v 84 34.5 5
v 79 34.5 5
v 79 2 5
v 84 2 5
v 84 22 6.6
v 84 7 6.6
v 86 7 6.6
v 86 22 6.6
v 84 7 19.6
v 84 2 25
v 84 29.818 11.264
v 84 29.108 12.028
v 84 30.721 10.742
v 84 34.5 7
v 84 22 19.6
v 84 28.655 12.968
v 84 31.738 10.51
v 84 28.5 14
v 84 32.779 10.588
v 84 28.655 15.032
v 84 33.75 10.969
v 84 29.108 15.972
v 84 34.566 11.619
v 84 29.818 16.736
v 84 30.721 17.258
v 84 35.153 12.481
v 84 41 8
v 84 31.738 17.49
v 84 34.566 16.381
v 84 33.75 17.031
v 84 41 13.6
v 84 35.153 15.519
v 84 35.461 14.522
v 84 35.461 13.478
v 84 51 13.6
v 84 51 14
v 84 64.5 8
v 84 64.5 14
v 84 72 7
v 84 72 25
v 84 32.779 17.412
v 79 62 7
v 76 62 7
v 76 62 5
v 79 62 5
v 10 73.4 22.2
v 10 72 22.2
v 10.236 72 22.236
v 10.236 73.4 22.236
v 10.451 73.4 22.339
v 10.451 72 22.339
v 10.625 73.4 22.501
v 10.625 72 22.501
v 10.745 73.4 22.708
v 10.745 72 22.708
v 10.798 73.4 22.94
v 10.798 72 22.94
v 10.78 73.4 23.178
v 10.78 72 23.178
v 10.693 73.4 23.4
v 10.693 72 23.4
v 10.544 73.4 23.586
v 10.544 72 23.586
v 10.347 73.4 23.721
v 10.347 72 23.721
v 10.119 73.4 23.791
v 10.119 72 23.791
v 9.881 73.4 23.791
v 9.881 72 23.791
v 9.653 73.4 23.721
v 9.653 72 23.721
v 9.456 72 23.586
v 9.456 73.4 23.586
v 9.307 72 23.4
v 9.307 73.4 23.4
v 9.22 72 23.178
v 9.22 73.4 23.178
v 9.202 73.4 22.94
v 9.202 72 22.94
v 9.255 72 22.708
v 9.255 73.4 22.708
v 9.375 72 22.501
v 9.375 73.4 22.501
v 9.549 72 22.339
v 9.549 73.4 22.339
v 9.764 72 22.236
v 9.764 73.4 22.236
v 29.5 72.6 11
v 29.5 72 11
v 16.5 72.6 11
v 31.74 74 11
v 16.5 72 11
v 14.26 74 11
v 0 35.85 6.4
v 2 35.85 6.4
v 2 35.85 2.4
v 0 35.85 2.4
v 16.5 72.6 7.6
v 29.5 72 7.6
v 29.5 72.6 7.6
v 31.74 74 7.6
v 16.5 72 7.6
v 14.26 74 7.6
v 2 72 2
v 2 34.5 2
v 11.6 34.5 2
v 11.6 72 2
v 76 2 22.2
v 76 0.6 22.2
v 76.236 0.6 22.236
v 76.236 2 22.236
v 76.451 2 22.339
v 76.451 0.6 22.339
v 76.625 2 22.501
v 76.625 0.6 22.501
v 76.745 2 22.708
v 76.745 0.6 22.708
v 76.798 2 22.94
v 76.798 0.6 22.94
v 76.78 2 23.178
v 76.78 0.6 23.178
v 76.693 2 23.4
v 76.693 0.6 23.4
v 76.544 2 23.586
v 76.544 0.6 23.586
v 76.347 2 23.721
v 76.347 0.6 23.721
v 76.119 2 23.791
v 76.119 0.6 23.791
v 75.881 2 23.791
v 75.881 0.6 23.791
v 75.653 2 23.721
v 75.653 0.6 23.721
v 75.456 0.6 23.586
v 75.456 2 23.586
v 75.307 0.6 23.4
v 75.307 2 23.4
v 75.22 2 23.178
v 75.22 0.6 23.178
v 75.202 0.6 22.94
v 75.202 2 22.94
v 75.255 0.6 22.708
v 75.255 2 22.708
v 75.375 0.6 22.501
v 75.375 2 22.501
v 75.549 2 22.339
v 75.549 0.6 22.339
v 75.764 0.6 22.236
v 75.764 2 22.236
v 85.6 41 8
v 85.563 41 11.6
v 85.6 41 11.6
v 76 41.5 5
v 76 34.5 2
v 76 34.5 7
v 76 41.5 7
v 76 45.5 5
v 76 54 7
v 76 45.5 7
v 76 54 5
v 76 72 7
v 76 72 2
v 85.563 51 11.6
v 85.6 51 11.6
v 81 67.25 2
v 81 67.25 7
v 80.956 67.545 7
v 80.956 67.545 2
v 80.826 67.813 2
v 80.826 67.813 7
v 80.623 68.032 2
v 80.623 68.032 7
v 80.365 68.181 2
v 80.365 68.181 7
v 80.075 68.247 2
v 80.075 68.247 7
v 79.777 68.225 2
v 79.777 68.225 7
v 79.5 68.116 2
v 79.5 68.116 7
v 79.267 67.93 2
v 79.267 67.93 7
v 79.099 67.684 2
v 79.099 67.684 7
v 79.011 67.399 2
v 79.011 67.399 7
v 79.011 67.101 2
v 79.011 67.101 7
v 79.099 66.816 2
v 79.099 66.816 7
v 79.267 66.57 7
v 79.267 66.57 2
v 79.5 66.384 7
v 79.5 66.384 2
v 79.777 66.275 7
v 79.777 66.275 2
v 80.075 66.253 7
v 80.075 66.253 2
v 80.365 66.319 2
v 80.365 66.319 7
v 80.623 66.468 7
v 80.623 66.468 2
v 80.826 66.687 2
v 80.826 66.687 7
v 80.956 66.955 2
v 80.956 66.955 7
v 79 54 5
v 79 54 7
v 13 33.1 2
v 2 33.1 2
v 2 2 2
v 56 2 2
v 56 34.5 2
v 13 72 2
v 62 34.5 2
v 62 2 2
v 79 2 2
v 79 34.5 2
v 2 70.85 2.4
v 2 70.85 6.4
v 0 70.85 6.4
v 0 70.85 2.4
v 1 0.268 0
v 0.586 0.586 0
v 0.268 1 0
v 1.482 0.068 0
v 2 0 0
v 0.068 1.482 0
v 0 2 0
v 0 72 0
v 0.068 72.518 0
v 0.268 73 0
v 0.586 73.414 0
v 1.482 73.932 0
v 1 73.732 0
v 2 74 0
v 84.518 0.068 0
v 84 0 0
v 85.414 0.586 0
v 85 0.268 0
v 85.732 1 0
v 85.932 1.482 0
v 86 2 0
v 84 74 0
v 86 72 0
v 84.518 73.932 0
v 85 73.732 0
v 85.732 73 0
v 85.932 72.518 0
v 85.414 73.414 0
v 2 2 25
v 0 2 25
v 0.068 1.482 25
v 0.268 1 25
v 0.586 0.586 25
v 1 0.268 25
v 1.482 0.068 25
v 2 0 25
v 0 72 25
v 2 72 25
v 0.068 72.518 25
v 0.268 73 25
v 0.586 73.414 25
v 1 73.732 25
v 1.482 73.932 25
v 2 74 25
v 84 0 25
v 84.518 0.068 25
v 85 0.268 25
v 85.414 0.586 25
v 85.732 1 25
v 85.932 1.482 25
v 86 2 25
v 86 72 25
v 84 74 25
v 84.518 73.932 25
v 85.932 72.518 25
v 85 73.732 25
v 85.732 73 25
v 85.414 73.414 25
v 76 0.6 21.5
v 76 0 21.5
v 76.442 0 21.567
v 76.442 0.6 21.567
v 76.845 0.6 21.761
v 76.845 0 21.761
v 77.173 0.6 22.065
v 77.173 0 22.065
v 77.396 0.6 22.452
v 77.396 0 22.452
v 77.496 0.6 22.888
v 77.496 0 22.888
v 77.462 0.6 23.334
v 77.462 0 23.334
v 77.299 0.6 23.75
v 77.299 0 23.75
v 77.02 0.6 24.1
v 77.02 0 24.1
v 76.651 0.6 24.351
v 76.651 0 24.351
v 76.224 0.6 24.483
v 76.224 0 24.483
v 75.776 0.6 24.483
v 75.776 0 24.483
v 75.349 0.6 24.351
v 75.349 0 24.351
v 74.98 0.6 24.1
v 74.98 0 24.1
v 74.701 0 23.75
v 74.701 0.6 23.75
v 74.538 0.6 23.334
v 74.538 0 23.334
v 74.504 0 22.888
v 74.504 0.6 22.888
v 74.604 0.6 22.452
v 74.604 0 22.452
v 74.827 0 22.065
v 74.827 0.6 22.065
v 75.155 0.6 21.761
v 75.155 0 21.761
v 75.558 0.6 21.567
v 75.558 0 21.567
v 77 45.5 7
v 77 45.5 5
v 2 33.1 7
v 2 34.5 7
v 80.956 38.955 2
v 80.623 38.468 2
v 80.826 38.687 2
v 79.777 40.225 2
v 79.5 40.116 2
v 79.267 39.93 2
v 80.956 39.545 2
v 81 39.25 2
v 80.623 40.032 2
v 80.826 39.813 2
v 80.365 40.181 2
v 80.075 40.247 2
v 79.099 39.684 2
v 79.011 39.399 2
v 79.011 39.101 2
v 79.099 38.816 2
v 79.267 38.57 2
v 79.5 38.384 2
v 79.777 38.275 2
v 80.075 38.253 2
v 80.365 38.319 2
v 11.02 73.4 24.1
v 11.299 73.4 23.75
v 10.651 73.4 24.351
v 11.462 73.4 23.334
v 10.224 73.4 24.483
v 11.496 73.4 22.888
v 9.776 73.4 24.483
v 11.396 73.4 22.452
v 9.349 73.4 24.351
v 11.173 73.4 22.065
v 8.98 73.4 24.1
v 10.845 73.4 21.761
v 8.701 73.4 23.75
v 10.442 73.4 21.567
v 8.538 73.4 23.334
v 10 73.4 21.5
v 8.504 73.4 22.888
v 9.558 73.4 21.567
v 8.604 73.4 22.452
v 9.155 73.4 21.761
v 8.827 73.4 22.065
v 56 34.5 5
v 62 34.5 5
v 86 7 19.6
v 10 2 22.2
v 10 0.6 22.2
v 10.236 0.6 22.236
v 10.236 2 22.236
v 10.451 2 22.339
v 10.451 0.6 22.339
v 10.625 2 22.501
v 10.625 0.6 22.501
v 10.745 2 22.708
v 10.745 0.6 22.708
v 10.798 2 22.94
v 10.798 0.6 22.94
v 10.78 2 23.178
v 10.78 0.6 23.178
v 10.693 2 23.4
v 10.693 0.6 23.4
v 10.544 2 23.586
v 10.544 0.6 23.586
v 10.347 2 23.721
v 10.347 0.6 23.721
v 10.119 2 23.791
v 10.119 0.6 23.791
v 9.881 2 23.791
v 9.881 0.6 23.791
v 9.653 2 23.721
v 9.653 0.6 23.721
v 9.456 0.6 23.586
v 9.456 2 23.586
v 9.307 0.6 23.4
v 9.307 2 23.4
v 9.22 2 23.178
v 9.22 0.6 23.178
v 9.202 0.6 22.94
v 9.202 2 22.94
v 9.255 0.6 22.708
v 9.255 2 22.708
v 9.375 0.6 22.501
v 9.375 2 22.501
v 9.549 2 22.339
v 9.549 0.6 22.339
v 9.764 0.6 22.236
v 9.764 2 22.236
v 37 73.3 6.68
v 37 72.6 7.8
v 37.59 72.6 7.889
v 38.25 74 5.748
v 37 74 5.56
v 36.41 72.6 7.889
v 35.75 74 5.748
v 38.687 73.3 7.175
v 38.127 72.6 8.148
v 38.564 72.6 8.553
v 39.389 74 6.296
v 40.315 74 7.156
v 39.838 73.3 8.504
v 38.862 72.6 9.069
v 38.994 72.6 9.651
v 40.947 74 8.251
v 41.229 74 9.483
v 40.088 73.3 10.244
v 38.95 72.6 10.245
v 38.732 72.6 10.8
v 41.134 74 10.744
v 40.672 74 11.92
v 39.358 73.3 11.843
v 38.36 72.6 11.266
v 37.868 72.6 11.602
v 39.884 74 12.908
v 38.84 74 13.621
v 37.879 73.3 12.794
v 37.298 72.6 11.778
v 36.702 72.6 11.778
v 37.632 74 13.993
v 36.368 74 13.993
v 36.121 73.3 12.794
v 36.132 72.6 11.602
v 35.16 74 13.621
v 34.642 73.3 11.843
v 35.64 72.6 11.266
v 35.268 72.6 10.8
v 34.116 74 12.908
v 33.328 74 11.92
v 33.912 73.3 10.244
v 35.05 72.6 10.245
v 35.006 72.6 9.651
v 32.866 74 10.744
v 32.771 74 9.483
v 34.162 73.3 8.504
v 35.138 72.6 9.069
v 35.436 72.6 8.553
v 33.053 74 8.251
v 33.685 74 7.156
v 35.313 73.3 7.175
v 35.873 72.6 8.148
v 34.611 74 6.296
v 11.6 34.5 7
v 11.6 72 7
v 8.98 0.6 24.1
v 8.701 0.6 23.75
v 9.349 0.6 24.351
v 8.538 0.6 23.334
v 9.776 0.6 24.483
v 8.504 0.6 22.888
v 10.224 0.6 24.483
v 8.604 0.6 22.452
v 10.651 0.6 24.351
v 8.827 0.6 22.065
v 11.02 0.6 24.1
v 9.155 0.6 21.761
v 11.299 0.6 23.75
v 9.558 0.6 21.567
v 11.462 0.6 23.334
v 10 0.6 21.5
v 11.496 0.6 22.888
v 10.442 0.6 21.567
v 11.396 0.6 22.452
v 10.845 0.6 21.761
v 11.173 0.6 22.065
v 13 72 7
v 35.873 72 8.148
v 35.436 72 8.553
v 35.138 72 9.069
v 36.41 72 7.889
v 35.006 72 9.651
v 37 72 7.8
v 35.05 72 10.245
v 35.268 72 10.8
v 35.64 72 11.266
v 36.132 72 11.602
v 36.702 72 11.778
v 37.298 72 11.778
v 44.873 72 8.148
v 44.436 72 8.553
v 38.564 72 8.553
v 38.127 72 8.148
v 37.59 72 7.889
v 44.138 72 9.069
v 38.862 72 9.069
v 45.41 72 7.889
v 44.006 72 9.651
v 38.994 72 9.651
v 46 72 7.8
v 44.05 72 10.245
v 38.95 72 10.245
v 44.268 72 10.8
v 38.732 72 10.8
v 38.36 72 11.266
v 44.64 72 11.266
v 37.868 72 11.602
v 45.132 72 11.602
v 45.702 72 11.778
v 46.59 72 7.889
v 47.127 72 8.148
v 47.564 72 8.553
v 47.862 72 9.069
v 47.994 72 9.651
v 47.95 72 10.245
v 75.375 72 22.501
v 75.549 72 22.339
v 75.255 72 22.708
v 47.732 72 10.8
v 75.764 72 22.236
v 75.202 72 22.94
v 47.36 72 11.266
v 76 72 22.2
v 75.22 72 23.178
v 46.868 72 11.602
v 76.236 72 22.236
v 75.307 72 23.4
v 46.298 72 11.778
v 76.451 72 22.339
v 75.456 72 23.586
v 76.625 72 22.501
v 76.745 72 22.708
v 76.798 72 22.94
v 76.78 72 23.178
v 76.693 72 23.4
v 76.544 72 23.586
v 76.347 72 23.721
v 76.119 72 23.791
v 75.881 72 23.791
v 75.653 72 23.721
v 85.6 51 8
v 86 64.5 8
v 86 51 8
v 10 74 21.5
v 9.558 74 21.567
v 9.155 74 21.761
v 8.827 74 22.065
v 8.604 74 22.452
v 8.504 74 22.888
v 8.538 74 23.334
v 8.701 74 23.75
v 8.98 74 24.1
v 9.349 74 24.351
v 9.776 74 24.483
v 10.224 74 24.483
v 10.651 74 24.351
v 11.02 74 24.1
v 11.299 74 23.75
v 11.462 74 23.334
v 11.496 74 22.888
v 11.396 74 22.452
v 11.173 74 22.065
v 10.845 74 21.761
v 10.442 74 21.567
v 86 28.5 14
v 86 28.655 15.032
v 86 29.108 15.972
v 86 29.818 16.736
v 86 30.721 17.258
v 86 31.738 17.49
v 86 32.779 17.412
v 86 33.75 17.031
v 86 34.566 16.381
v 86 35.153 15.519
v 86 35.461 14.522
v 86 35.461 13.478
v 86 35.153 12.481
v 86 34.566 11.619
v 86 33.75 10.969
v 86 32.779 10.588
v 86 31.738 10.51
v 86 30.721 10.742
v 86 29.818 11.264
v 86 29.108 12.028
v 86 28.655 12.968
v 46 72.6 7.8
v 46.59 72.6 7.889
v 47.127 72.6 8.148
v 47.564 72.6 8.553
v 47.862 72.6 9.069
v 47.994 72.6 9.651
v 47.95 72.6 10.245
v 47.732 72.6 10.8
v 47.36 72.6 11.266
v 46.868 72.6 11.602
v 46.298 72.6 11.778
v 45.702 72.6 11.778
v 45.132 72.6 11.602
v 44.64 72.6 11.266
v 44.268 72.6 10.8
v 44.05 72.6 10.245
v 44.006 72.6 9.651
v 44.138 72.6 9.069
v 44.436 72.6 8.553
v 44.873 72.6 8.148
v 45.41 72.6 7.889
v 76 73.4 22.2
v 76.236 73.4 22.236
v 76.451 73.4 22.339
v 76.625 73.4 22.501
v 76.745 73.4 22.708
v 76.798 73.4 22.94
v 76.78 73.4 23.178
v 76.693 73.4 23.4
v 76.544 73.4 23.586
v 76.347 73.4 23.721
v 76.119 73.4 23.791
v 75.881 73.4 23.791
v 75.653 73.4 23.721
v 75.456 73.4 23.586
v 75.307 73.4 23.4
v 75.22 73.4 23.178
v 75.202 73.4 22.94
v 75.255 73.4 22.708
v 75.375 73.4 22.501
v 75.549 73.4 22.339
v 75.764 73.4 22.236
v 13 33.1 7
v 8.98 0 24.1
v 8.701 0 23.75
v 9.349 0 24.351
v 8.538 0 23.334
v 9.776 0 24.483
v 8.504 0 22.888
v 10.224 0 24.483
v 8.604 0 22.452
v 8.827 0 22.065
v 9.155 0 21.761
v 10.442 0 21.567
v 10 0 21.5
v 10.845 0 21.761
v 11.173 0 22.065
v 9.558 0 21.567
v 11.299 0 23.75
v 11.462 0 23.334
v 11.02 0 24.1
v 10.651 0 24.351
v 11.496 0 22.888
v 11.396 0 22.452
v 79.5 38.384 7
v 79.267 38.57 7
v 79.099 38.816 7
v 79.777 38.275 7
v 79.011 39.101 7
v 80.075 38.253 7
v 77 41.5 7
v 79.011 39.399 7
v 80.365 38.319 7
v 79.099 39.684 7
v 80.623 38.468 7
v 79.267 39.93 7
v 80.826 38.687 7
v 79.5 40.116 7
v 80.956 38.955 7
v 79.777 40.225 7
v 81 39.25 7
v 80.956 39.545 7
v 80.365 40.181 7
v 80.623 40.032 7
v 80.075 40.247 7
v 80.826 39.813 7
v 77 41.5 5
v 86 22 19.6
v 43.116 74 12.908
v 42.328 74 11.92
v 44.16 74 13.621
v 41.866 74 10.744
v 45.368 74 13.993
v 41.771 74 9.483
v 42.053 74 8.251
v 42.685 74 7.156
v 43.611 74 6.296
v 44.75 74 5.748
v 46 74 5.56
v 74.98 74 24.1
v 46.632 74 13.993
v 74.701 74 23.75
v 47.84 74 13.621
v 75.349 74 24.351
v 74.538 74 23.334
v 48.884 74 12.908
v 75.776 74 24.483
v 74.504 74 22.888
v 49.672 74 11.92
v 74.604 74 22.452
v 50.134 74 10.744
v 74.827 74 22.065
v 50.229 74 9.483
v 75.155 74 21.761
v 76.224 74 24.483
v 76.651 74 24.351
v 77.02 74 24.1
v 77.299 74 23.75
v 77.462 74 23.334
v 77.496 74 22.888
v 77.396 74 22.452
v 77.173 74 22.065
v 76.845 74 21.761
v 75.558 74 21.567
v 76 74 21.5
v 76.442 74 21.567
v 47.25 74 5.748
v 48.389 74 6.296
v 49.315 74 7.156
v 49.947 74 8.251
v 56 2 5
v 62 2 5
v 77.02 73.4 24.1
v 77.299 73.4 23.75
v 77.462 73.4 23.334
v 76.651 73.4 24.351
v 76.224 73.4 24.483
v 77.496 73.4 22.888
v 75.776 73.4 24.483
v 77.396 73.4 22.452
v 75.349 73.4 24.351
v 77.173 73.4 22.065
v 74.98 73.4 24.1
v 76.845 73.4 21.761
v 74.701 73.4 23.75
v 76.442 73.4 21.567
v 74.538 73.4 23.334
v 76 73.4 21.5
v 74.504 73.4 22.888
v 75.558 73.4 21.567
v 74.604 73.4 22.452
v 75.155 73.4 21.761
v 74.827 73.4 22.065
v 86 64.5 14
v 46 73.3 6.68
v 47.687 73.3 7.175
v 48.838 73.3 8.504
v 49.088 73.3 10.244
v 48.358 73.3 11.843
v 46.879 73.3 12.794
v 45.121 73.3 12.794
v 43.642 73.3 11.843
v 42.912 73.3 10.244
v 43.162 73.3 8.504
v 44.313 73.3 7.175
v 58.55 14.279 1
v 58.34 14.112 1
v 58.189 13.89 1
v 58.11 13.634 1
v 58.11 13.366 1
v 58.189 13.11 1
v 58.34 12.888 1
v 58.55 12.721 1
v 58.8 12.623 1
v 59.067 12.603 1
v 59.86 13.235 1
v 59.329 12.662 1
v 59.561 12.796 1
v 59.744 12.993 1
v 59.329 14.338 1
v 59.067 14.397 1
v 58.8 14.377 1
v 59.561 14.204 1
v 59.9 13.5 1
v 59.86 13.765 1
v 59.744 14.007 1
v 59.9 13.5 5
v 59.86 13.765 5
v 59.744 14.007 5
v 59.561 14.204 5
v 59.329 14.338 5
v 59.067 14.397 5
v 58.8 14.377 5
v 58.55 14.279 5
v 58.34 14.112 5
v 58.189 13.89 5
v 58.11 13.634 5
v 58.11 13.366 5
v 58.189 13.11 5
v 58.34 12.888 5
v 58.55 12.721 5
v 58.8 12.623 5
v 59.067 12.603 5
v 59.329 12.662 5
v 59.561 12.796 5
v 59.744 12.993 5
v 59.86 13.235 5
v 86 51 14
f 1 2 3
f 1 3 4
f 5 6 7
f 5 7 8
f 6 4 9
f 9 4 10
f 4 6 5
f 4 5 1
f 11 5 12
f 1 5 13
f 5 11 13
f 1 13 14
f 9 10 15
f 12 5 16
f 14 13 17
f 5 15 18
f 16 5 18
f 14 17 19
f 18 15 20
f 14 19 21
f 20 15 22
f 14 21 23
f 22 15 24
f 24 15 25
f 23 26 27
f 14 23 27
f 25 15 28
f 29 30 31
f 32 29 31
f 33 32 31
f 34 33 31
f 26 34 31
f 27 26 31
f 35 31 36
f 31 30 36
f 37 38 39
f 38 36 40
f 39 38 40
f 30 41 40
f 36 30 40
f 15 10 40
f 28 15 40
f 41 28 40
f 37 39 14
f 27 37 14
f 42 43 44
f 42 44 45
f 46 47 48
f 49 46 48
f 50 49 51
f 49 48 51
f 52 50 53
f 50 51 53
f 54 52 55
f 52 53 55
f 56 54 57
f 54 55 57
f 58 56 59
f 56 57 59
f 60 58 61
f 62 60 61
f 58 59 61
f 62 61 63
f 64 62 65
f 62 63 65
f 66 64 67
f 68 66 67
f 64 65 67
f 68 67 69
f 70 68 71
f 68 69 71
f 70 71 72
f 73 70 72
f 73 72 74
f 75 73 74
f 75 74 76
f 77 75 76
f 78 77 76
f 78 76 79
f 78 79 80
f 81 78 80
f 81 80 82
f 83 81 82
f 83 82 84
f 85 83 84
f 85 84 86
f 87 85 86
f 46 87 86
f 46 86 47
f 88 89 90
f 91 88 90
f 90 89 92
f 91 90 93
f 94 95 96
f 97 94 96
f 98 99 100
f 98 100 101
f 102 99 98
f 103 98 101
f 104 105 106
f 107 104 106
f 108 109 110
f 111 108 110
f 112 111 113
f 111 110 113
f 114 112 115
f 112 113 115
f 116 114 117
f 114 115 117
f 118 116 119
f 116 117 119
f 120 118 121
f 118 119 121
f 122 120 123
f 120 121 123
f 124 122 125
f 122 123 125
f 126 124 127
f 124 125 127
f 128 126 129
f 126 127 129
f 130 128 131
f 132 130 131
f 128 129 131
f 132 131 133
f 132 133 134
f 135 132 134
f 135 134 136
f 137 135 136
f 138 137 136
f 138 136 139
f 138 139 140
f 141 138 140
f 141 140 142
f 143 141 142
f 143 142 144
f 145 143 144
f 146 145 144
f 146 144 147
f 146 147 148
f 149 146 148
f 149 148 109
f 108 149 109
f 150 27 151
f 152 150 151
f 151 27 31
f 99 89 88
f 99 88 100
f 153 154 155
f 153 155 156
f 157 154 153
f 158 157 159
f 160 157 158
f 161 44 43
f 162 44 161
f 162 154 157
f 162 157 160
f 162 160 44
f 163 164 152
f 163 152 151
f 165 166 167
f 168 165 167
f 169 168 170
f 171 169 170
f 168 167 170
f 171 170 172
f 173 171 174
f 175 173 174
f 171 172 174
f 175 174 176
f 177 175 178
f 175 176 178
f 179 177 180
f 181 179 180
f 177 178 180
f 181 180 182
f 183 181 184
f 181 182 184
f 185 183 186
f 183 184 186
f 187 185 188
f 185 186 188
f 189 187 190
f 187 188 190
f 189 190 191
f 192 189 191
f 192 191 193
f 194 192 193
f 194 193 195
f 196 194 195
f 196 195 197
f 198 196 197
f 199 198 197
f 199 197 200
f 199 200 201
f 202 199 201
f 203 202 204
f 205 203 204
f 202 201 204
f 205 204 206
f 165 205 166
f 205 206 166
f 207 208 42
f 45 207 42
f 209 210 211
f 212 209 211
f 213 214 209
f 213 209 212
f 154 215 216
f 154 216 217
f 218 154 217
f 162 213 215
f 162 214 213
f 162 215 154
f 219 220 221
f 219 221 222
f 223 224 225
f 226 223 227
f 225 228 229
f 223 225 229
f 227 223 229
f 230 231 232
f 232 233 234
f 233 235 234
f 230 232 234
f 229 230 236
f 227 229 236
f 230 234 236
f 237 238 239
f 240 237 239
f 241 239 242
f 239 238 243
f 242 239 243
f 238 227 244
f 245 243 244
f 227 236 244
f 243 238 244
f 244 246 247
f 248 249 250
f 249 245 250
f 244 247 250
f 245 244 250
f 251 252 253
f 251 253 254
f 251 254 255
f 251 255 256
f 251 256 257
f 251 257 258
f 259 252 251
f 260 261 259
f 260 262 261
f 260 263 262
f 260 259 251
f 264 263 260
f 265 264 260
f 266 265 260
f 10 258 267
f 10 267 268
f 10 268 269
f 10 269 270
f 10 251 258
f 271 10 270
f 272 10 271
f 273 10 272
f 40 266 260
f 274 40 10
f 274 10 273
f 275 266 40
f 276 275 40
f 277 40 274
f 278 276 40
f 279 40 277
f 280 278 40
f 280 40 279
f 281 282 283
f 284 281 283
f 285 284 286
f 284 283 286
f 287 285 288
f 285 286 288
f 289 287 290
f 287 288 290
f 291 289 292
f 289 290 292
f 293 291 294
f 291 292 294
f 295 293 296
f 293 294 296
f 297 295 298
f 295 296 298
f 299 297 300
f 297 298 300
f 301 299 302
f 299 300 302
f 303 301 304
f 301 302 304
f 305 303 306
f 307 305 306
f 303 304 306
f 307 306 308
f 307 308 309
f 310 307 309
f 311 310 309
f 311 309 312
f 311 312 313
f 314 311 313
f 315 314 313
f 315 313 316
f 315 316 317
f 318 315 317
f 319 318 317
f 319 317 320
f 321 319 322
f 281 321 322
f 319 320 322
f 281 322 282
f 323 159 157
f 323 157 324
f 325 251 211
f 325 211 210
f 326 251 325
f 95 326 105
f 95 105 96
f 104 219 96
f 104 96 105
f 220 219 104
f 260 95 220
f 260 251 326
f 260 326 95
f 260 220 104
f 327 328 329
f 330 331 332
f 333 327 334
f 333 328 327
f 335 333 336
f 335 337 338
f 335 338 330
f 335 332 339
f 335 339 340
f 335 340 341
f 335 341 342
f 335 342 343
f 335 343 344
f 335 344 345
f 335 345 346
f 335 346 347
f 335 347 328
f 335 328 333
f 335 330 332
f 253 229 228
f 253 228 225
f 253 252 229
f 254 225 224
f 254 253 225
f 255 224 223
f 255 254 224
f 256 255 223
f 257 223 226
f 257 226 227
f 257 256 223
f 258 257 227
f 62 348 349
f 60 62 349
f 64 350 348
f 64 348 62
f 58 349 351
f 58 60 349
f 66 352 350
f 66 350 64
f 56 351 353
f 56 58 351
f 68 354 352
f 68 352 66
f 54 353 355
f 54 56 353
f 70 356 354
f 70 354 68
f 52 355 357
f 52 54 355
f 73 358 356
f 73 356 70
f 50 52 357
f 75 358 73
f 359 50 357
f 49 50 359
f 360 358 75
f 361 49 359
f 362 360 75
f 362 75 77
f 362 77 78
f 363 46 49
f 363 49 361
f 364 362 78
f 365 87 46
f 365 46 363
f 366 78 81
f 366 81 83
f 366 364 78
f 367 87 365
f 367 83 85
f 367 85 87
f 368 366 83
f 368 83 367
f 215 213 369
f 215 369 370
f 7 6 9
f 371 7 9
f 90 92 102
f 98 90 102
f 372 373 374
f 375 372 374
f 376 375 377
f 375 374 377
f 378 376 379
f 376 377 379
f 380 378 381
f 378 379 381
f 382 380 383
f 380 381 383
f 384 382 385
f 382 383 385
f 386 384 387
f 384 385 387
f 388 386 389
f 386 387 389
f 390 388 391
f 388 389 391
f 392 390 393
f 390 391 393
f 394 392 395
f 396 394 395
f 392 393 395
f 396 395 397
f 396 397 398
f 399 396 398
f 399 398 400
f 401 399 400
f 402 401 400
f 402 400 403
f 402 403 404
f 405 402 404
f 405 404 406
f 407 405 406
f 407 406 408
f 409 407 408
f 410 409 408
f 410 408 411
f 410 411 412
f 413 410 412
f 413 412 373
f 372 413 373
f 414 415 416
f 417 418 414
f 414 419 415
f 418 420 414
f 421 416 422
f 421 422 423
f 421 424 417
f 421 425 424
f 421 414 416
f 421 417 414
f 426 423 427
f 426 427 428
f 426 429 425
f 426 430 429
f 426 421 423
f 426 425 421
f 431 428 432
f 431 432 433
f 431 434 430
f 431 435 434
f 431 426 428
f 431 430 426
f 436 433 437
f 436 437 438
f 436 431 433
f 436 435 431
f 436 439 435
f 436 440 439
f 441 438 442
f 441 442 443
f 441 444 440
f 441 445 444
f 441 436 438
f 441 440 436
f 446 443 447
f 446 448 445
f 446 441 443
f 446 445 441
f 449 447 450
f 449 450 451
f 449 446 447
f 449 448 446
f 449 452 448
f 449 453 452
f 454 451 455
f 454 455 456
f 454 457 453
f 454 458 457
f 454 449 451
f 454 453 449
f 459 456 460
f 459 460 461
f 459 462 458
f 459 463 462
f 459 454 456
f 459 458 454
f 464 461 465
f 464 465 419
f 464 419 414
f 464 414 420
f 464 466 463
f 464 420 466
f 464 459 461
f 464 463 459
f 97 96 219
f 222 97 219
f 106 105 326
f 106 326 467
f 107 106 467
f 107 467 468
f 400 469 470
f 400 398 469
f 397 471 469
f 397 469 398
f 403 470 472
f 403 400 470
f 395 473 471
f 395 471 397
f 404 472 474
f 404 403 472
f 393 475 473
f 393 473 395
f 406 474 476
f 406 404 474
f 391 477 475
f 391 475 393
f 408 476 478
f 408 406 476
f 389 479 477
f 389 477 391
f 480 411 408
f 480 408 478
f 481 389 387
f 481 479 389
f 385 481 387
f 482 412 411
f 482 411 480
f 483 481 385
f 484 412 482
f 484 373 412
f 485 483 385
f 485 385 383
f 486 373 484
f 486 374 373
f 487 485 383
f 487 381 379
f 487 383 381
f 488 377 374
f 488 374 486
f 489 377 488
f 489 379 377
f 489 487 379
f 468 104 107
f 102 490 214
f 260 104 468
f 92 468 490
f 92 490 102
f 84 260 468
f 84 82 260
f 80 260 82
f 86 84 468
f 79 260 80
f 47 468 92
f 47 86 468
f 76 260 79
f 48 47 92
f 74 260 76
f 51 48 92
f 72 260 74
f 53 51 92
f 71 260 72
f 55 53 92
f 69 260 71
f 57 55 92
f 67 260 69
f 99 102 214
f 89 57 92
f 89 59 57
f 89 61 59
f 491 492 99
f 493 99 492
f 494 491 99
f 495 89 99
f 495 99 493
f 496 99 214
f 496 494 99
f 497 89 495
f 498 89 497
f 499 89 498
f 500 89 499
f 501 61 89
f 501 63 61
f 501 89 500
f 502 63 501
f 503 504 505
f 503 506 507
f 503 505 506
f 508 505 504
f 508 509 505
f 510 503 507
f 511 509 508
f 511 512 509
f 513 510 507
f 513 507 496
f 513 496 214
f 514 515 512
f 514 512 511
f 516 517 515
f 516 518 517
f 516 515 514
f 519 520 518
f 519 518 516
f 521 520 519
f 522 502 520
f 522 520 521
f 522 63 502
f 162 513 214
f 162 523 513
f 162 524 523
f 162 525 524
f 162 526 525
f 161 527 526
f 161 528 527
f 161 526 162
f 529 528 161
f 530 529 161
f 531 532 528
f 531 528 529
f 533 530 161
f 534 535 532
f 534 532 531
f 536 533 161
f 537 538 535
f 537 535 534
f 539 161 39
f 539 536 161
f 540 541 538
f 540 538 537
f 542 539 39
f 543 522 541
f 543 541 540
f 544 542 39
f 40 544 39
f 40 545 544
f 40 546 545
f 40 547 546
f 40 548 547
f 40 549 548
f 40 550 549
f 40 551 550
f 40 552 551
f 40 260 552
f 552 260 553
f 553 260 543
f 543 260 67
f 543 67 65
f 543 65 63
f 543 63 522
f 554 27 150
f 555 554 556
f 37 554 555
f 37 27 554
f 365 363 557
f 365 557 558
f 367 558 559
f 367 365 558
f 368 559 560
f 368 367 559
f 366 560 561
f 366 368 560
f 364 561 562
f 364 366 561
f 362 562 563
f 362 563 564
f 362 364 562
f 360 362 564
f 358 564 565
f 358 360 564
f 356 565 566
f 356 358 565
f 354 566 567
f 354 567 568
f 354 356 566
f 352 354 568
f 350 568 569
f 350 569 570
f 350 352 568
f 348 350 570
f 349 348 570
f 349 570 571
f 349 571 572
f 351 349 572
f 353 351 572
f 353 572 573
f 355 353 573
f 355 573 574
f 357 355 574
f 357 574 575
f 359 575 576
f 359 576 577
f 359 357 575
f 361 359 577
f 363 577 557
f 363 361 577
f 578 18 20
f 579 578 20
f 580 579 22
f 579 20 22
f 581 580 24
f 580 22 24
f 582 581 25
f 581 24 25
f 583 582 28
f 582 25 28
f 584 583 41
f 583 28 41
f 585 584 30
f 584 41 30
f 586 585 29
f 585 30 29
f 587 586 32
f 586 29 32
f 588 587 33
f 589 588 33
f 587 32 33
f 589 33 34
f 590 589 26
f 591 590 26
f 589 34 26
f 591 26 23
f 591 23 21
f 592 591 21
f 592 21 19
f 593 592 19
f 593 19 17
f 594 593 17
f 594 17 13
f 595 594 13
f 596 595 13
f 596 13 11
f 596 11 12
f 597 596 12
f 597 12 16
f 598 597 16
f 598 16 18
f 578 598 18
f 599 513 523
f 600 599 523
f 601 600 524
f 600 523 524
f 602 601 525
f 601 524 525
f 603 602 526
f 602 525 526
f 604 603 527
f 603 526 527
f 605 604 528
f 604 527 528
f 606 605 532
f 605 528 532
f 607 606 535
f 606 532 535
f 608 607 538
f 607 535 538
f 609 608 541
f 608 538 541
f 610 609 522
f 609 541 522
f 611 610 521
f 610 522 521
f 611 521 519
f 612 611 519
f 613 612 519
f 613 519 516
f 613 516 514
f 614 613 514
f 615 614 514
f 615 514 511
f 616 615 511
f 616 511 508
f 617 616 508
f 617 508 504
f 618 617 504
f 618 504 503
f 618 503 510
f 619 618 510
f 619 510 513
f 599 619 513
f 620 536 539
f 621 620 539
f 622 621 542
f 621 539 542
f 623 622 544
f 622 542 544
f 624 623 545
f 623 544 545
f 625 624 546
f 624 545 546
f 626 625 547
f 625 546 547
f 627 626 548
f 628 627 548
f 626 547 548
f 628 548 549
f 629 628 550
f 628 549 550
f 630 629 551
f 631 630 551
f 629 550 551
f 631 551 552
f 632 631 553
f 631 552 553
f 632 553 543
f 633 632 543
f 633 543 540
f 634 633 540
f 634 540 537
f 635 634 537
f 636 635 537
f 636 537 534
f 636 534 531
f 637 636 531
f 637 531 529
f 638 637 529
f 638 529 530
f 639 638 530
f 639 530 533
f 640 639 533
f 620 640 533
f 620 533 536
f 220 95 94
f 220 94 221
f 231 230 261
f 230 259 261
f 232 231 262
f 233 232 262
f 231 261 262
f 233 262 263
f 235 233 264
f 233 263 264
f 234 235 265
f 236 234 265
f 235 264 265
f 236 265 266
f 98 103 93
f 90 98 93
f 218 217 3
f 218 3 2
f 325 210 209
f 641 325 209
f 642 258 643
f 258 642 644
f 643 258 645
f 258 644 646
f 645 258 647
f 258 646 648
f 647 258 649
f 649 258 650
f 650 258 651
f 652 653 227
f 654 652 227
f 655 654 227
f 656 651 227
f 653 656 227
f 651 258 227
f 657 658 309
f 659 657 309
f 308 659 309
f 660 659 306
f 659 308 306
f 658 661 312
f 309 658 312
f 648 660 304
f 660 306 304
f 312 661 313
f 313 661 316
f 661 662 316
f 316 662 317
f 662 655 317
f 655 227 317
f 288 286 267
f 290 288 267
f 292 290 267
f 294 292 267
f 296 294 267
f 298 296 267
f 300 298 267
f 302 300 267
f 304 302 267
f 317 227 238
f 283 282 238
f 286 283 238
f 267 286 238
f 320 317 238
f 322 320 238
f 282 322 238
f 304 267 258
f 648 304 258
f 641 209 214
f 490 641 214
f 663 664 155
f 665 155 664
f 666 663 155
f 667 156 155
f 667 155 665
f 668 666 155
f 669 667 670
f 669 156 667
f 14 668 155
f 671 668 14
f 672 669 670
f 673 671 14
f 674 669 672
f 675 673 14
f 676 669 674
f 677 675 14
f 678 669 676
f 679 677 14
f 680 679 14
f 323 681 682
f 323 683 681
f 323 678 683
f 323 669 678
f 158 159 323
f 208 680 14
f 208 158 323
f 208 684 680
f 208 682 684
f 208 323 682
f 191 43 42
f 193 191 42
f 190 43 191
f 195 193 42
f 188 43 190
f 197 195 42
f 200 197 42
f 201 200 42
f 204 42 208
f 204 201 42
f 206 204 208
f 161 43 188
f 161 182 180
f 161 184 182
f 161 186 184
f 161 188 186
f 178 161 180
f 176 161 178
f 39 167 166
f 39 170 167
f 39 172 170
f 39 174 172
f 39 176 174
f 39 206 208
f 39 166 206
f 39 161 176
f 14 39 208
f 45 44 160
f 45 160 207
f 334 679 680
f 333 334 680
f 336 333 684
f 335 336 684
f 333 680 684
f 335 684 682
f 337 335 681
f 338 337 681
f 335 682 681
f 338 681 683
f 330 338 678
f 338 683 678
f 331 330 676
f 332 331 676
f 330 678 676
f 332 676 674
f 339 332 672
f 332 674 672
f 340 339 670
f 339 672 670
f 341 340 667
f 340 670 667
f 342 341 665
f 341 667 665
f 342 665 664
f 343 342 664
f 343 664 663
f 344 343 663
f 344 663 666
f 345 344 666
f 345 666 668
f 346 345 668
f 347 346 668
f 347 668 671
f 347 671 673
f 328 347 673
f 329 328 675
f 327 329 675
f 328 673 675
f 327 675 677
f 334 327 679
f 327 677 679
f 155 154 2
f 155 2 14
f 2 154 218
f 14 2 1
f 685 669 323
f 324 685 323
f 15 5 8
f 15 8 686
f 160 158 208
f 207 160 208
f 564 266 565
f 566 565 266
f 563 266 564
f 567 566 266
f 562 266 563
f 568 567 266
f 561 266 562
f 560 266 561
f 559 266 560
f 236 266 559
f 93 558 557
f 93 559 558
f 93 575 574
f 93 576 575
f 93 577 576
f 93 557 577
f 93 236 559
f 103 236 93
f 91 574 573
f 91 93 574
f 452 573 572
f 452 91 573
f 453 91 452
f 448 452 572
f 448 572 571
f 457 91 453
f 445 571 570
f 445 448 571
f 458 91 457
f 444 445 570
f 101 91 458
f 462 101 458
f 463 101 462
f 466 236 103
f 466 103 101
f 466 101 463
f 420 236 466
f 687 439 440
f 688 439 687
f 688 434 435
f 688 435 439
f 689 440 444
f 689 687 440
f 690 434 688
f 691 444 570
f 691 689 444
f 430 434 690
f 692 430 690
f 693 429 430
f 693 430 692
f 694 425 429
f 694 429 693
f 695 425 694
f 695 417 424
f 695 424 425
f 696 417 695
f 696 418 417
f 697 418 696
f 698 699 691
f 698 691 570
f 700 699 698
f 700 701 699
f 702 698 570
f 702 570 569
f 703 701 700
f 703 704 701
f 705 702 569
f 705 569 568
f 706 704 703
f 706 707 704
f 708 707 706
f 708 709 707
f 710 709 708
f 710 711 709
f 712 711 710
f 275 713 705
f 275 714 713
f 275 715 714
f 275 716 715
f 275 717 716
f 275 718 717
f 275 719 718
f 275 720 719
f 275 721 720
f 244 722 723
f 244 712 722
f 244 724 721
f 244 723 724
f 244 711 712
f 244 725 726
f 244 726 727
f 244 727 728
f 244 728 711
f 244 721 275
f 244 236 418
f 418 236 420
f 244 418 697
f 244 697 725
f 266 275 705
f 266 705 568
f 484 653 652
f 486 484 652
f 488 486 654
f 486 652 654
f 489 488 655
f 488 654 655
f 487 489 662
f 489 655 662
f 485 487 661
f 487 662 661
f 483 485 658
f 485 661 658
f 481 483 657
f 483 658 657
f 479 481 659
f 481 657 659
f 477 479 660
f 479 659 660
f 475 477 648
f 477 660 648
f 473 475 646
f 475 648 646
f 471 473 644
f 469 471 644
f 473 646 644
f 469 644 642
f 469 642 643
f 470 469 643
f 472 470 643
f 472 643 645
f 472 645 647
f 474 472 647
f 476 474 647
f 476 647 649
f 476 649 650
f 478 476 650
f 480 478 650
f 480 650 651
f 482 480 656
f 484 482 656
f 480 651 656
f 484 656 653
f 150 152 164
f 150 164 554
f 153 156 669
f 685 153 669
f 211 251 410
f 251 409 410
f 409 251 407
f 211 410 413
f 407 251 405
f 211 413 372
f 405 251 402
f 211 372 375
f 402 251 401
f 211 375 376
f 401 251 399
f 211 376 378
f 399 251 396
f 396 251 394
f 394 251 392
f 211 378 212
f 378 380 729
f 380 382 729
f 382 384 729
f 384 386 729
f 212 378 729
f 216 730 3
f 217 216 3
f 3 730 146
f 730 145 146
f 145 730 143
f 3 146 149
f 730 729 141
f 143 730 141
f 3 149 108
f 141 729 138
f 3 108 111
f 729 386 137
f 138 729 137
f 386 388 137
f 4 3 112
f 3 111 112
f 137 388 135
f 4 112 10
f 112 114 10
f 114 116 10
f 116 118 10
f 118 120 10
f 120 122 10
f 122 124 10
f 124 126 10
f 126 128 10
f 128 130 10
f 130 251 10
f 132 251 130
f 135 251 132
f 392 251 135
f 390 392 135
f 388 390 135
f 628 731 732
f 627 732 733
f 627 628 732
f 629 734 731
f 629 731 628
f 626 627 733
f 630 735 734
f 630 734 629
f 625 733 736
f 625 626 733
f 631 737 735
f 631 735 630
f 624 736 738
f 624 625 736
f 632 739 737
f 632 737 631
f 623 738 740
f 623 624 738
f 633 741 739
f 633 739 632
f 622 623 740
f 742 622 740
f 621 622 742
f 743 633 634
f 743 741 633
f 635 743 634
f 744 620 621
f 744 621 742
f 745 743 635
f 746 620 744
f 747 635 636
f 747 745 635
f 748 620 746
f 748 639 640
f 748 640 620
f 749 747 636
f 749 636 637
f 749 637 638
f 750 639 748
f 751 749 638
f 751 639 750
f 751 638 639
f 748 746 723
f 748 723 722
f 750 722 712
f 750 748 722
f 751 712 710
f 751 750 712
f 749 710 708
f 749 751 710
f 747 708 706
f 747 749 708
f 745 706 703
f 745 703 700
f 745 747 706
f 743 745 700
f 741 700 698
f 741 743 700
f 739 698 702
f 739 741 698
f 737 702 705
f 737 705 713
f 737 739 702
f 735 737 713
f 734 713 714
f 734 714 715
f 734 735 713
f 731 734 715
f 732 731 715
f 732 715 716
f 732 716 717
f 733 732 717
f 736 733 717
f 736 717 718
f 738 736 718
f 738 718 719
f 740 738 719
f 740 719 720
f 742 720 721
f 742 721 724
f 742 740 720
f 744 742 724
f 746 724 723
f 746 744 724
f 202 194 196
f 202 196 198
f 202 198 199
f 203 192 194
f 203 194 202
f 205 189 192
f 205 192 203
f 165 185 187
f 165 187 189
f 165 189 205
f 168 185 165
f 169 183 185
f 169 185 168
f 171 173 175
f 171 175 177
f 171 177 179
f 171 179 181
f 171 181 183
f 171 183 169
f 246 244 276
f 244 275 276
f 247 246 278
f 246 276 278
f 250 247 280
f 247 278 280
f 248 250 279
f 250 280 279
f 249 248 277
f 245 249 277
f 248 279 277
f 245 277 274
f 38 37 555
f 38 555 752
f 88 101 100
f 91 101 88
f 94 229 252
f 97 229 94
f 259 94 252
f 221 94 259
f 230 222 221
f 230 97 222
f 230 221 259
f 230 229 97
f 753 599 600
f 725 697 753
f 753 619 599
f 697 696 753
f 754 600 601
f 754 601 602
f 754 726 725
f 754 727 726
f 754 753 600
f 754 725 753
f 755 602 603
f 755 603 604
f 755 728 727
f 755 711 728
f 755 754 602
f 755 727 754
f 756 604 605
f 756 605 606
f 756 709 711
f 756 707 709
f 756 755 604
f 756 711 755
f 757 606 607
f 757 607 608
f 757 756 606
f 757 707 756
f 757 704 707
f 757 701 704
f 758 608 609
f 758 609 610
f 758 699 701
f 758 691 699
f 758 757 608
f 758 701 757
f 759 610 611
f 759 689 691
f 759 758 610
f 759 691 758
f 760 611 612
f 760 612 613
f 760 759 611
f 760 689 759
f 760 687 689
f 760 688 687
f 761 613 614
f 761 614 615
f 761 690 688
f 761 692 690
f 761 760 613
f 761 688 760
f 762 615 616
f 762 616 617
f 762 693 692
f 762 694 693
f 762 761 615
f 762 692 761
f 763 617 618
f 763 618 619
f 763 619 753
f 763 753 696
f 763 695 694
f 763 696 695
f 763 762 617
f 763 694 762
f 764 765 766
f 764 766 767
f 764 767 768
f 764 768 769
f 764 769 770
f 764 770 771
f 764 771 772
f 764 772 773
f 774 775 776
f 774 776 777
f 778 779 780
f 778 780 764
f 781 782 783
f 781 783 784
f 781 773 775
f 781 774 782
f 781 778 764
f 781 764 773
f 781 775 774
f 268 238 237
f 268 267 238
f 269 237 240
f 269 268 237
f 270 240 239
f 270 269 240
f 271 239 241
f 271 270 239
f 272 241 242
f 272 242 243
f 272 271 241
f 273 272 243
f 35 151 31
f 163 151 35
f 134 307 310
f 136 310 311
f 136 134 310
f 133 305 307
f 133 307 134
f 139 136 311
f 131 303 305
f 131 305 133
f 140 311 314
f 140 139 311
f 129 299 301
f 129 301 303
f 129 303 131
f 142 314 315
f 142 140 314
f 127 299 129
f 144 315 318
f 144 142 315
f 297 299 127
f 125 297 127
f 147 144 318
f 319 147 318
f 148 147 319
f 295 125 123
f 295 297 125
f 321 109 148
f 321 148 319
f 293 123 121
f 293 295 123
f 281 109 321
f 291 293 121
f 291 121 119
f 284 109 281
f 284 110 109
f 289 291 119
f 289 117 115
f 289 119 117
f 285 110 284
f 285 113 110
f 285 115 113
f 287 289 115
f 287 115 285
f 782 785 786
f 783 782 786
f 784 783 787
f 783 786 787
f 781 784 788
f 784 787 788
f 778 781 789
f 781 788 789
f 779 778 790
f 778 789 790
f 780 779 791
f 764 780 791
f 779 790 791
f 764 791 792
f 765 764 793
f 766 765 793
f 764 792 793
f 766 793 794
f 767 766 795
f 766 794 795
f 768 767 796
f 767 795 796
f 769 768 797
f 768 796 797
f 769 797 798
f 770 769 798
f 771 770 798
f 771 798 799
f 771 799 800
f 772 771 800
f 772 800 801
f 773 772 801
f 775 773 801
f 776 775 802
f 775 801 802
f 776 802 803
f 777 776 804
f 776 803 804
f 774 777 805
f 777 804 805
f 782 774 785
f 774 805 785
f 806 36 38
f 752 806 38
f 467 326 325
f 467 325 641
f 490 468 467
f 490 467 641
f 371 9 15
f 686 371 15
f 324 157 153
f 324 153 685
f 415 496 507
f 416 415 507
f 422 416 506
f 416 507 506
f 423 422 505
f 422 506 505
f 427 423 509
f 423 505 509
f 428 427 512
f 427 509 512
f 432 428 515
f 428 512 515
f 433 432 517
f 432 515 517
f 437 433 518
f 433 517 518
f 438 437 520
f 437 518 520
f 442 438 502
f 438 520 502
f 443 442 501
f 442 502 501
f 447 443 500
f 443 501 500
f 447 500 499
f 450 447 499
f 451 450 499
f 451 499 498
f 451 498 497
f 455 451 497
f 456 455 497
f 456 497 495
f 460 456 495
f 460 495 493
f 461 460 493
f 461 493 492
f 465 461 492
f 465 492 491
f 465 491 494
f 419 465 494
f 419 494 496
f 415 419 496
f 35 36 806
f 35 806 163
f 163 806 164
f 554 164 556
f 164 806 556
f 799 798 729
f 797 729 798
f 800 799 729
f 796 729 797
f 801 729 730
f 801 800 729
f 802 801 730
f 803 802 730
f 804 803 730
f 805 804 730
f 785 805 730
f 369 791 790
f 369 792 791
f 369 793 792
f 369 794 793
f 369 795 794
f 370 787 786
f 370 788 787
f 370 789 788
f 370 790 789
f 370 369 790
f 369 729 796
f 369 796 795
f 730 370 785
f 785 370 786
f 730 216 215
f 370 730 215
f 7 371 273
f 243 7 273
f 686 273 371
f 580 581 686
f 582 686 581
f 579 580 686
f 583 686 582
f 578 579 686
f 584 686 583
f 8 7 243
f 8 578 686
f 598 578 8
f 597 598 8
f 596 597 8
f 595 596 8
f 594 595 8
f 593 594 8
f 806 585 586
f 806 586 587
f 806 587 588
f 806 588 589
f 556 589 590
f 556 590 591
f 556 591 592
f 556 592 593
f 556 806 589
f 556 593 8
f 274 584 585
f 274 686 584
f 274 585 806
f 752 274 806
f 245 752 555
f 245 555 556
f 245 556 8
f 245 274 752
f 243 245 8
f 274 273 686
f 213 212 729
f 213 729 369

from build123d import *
from OCP.BRepFilletAPI import BRepFilletAPI_MakeChamfer

# Parameters (mm, degrees)
SKETCH1_W           = 86
SKETCH1_H           = 74
BOSS_EXTRUDE1_DEPTH = 25
SKETCH3_W           = 82
SKETCH3_H           = 70
CUT_EXTRUDE1_DEPTH  = 23
SKETCH4_W           = 8
SKETCH4_H           = 37.5
SKETCH4_W_2         = 1.4
BOSS_EXTRUDE2_DEPTH = 5
SKETCH5_W           = 3
SKETCH5_H           = 8
SKETCH5_W_2         = 1
SKETCH5_H_2         = 4
CUT_EXTRUDE2_DEPTH  = 2
SKETCH6_R           = 1
CUT_EXTRUDE3_DEPTH  = 5
SKETCH7_W           = 4
SKETCH7_H           = 35
CUT_EXTRUDE4_DEPTH  = 5
SKETCH8_W           = 6
SKETCH8_H           = 23.5
CUT_EXTRUDE5_DEPTH  = 5
SKETCH9_W           = 5
SKETCH9_H           = 32.5
SKETCH9_W_2         = 6
BOSS_EXTRUDE3_DEPTH = 3
SKETCH10_R          = 0.9
CUT_EXTRUDE6_DEPTH  = 4
SKETCH11_W          = 13
SKETCH11_H          = 15
CUT_EXTRUDE7_DEPTH  = 4
FILLET1_R           = 2
SKETCH12_R          = 3.5
CUT_EXTRUDE8_DEPTH  = 4
SKETCH13_R          = 2
SKETCH13_W          = 13
SKETCH13_H          = 3.4
CUT_EXTRUDE9_DEPTH  = 4
CHAMFER1_SIZE       = 1.4
CHAMFER1_SIZE2      = 2.240468341
SKETCH14_R          = 0.8
CUT_EXTRUDE10_DEPTH = 76
SKETCH15_R          = 1.5
CUT_EXTRUDE11_DEPTH = 0.6
CUT_EXTRUDE12_START = -0.6
SKETCH16_R          = 1.5
CUT_EXTRUDE12_DEPTH = 0.6
SKETCH17_W          = 2
SKETCH17_H          = 10
BOSS_EXTRUDE4_DEPTH = 2.4
SKETCH18_W          = 3.6
SKETCH18_H          = 10
BOSS_EXTRUDE5_DEPTH = 0.4
CHAMFER2_SIZE       = 2
CHAMFER2_SIZE2      = 1.562571253
SKETCH20_W          = 11
SKETCH20_H          = 1.4
BOSS_EXTRUDE6_DEPTH = 5


with BuildPart() as part:
    # Sketch1 → Boss-Extrude1 (new body)
    with BuildSketch(Plane.XY):
        with Locations((43, 37)):
            Rectangle(SKETCH1_W, SKETCH1_H)
    extrude(amount=BOSS_EXTRUDE1_DEPTH)

    # Sketch3 → Cut-Extrude1 (cut)
    with BuildSketch(Plane.XY.offset(25)):
        with Locations((43, 37)):
            Rectangle(SKETCH3_W, SKETCH3_H)
    extrude(amount=-CUT_EXTRUDE1_DEPTH, mode=Mode.SUBTRACT)

    # Sketch4 → Boss-Extrude2 (add)
    with BuildSketch(Plane.XY.offset(2)):
        with Locations((80, 53.25)):
            Rectangle(SKETCH4_W, SKETCH4_H)
        with Locations((12.3, 53.25)):
            Rectangle(SKETCH4_W_2, SKETCH4_H)
    extrude(amount=BOSS_EXTRUDE2_DEPTH)

    # Sketch5 → Cut-Extrude2 (cut)
    with BuildSketch(Plane.XY.offset(7)):
        with Locations((77.5, 58)):
            Rectangle(SKETCH5_W, SKETCH5_H)
        with Locations((76.5, 43.5)):
            Rectangle(SKETCH5_W_2, SKETCH5_H_2)
    extrude(amount=-CUT_EXTRUDE2_DEPTH, mode=Mode.SUBTRACT)

    # Sketch6 → Cut-Extrude3 (cut)
    with BuildSketch(Plane.XY.offset(7)):
        with Locations((80, 67.25)):
            Circle(SKETCH6_R)
        with Locations((80, 39.25)):
            Circle(SKETCH6_R)
    extrude(amount=-CUT_EXTRUDE3_DEPTH, mode=Mode.SUBTRACT)

    # Sketch7 → Cut-Extrude4 (cut)
    with BuildSketch(Plane(origin=(2, 0, 0), x_dir=(0, 0, -1), z_dir=(1, 0, 0))):
        with Locations((-4.4, 53.35)):
            Rectangle(SKETCH7_W, SKETCH7_H)
    extrude(amount=-CUT_EXTRUDE4_DEPTH, mode=Mode.SUBTRACT)

    # Sketch8 → Cut-Extrude5 (cut)
    with BuildSketch(Plane.ZY.offset(-84)):
        with Locations((11, 52.75)):
            Rectangle(SKETCH8_W, SKETCH8_H)
    extrude(amount=-CUT_EXTRUDE5_DEPTH, mode=Mode.SUBTRACT)

    # Sketch9 → Boss-Extrude3 (add)
    with BuildSketch(Plane.XY.offset(2)):
        with Locations((81.5, 18.25)):
            Rectangle(SKETCH9_W, SKETCH9_H)
        with Locations((59, 18.25)):
            Rectangle(SKETCH9_W_2, SKETCH9_H)
    extrude(amount=BOSS_EXTRUDE3_DEPTH)

    # Sketch10 → Cut-Extrude6 (cut)
    with BuildSketch(Plane.XY.offset(5)):
        with Locations((59, 13.5)):
            Circle(SKETCH10_R)
    extrude(amount=-CUT_EXTRUDE6_DEPTH, mode=Mode.SUBTRACT)

    # Sketch11 → Cut-Extrude7 (cut)
    with BuildSketch(Plane.ZY.offset(-84)):
        with Locations((13.1, 14.5)):
            Rectangle(SKETCH11_W, SKETCH11_H)
    extrude(amount=-CUT_EXTRUDE7_DEPTH, mode=Mode.SUBTRACT)

    # Fillet1
    fillet1_edges = [part.edges().sort_by_distance(p)[0] for p in [
        (0, 74, 12.5),
        (86, 74, 12.5),
        (86, 0, 12.5),
        (0, 0, 12.5),
    ]]
    fillet(fillet1_edges, radius=FILLET1_R)

    # Sketch12 → Cut-Extrude8 (cut)
    with BuildSketch(Plane.ZY.offset(-84)):
        with Locations(Location((14, 32, 0), (0, 0, 270))):
            Circle(SKETCH12_R)
    extrude(amount=-CUT_EXTRUDE8_DEPTH, mode=Mode.SUBTRACT)

    # Sketch13 → Cut-Extrude9 (cut)
    with BuildSketch(Plane(origin=(0, 72, 0), x_dir=(-1, 0, 0), z_dir=(0, -1, 0))):
        with Locations(Location((-37, -9.8, 0), (0, 0, 90))):
            Circle(SKETCH13_R)
        with Locations(Location((-46, -9.8, 0), (0, 0, 90))):
            Circle(SKETCH13_R)
        with Locations((-23, -9.3)):
            Rectangle(SKETCH13_W, SKETCH13_H)
    extrude(amount=-CUT_EXTRUDE9_DEPTH, mode=Mode.SUBTRACT)

    # Chamfer1: one chamfer whose edges measure the first distance from different faces: ONE call of the kernel's chamfer builder (chamfer() names one face for all edges)
    chamfer1_edges_1 = [part.edges().sort_by_distance(p)[0] for p in [
        (16.5, 74, 9.3),
    ]]
    chamfer1_side_1 = [part.faces().sort_by_distance(p)[0] for p in [
        (16.5, 73, 9.3),
    ]]
    chamfer1_edges_2 = [part.edges().sort_by_distance(p)[0] for p in [
        (29.5, 74, 9.3),
    ]]
    chamfer1_side_2 = [part.faces().sort_by_distance(p)[0] for p in [
        (29.5, 73, 9.3),
    ]]
    chamfer1_edges_3 = [part.edges().sort_by_distance(p)[0] for p in [
        (37, 74, 11.8),
    ]]
    chamfer1_side_3 = [part.faces().sort_by_distance(p)[0] for p in [
        (37, 73, 11.8),
    ]]
    chamfer1_edges_4 = [part.edges().sort_by_distance(p)[0] for p in [
        (46, 74, 11.8),
    ]]
    chamfer1_side_4 = [part.faces().sort_by_distance(p)[0] for p in [
        (46, 73, 11.8),
    ]]
    chamfer1 = BRepFilletAPI_MakeChamfer(part.part.solid().wrapped)
    for e in chamfer1_edges_1:
        chamfer1.Add(CHAMFER1_SIZE, CHAMFER1_SIZE2, e.wrapped, chamfer1_side_1[0].wrapped)  # the first distance lies on this face
    for e in chamfer1_edges_2:
        chamfer1.Add(CHAMFER1_SIZE, CHAMFER1_SIZE2, e.wrapped, chamfer1_side_2[0].wrapped)  # the first distance lies on this face
    for e in chamfer1_edges_3:
        chamfer1.Add(CHAMFER1_SIZE, CHAMFER1_SIZE2, e.wrapped, chamfer1_side_3[0].wrapped)  # the first distance lies on this face
    for e in chamfer1_edges_4:
        chamfer1.Add(CHAMFER1_SIZE, CHAMFER1_SIZE2, e.wrapped, chamfer1_side_4[0].wrapped)  # the first distance lies on this face
    add(Compound.cast(chamfer1.Shape()), mode=Mode.REPLACE)

    # Sketch14 → Cut-Extrude10 (cut)
    with BuildSketch(Plane(origin=(0, 0, 0), x_dir=(-1, 0, 0), z_dir=(0, -1, 0))):
        with Locations(Location((-10, -23, 0), (0, 0, 90))):
            Circle(SKETCH14_R)
        with Locations(Location((-76, -23, 0), (0, 0, 90))):
            Circle(SKETCH14_R)
    extrude(amount=-CUT_EXTRUDE10_DEPTH, mode=Mode.SUBTRACT)

    # Sketch15 → Cut-Extrude11 (cut)
    with BuildSketch(Plane(origin=(0, 0, 0), x_dir=(-1, 0, 0), z_dir=(0, -1, 0))):
        with Locations(Location((-10, -23, 0), (0, 0, 90))):
            Circle(SKETCH15_R)
        with Locations(Location((-76, -23, 0), (0, 0, 90))):
            Circle(SKETCH15_R)
    extrude(amount=-CUT_EXTRUDE11_DEPTH, mode=Mode.SUBTRACT)

    # Sketch16 → Cut-Extrude12 (cut)
    with BuildSketch(Plane(origin=(0, 74, 0), x_dir=(1, 0, 0), z_dir=(0, 1, 0)).offset(CUT_EXTRUDE12_START)):
        with Locations(Location((76, -23, 0), (0, 0, 90))):
            Circle(SKETCH16_R)
        with Locations(Location((10, -23, 0), (0, 0, 90))):
            Circle(SKETCH16_R)
    extrude(amount=CUT_EXTRUDE12_DEPTH, mode=Mode.SUBTRACT)

    # Sketch17 → Boss-Extrude4 (add)
    with BuildSketch(Plane(origin=(0, 0, 14), x_dir=(-1, 0, 0), z_dir=(0, 0, -1))):
        with Locations((-85, 46)):
            Rectangle(SKETCH17_W, SKETCH17_H)
    extrude(amount=BOSS_EXTRUDE4_DEPTH)

    # Sketch18 → Boss-Extrude5 (add)
    with BuildSketch(Plane(origin=(86, 0, 0), x_dir=(0, 0, -1), z_dir=(1, 0, 0))):
        with Locations((-9.8, 46)):
            Rectangle(SKETCH18_W, SKETCH18_H)
    extrude(amount=-BOSS_EXTRUDE5_DEPTH)

    # Chamfer2
    chamfer2_edges = [part.edges().sort_by_distance(p)[0] for p in [
        (84, 46, 11.6),
    ]]
    chamfer2_side = [part.faces().sort_by_distance(p)[0] for p in [
        (84, 38.391894294, 16.636900107),
    ]]
    chamfer(chamfer2_edges, length=CHAMFER2_SIZE, length2=CHAMFER2_SIZE2, reference=chamfer2_side[0])

    # Sketch20 → Boss-Extrude6 (add)
    with BuildSketch(Plane.XY.offset(2)):
        with Locations((7.5, 33.8)):
            Rectangle(SKETCH20_W, SKETCH20_H)
    extrude(amount=BOSS_EXTRUDE6_DEPTH)


solid = part.part
